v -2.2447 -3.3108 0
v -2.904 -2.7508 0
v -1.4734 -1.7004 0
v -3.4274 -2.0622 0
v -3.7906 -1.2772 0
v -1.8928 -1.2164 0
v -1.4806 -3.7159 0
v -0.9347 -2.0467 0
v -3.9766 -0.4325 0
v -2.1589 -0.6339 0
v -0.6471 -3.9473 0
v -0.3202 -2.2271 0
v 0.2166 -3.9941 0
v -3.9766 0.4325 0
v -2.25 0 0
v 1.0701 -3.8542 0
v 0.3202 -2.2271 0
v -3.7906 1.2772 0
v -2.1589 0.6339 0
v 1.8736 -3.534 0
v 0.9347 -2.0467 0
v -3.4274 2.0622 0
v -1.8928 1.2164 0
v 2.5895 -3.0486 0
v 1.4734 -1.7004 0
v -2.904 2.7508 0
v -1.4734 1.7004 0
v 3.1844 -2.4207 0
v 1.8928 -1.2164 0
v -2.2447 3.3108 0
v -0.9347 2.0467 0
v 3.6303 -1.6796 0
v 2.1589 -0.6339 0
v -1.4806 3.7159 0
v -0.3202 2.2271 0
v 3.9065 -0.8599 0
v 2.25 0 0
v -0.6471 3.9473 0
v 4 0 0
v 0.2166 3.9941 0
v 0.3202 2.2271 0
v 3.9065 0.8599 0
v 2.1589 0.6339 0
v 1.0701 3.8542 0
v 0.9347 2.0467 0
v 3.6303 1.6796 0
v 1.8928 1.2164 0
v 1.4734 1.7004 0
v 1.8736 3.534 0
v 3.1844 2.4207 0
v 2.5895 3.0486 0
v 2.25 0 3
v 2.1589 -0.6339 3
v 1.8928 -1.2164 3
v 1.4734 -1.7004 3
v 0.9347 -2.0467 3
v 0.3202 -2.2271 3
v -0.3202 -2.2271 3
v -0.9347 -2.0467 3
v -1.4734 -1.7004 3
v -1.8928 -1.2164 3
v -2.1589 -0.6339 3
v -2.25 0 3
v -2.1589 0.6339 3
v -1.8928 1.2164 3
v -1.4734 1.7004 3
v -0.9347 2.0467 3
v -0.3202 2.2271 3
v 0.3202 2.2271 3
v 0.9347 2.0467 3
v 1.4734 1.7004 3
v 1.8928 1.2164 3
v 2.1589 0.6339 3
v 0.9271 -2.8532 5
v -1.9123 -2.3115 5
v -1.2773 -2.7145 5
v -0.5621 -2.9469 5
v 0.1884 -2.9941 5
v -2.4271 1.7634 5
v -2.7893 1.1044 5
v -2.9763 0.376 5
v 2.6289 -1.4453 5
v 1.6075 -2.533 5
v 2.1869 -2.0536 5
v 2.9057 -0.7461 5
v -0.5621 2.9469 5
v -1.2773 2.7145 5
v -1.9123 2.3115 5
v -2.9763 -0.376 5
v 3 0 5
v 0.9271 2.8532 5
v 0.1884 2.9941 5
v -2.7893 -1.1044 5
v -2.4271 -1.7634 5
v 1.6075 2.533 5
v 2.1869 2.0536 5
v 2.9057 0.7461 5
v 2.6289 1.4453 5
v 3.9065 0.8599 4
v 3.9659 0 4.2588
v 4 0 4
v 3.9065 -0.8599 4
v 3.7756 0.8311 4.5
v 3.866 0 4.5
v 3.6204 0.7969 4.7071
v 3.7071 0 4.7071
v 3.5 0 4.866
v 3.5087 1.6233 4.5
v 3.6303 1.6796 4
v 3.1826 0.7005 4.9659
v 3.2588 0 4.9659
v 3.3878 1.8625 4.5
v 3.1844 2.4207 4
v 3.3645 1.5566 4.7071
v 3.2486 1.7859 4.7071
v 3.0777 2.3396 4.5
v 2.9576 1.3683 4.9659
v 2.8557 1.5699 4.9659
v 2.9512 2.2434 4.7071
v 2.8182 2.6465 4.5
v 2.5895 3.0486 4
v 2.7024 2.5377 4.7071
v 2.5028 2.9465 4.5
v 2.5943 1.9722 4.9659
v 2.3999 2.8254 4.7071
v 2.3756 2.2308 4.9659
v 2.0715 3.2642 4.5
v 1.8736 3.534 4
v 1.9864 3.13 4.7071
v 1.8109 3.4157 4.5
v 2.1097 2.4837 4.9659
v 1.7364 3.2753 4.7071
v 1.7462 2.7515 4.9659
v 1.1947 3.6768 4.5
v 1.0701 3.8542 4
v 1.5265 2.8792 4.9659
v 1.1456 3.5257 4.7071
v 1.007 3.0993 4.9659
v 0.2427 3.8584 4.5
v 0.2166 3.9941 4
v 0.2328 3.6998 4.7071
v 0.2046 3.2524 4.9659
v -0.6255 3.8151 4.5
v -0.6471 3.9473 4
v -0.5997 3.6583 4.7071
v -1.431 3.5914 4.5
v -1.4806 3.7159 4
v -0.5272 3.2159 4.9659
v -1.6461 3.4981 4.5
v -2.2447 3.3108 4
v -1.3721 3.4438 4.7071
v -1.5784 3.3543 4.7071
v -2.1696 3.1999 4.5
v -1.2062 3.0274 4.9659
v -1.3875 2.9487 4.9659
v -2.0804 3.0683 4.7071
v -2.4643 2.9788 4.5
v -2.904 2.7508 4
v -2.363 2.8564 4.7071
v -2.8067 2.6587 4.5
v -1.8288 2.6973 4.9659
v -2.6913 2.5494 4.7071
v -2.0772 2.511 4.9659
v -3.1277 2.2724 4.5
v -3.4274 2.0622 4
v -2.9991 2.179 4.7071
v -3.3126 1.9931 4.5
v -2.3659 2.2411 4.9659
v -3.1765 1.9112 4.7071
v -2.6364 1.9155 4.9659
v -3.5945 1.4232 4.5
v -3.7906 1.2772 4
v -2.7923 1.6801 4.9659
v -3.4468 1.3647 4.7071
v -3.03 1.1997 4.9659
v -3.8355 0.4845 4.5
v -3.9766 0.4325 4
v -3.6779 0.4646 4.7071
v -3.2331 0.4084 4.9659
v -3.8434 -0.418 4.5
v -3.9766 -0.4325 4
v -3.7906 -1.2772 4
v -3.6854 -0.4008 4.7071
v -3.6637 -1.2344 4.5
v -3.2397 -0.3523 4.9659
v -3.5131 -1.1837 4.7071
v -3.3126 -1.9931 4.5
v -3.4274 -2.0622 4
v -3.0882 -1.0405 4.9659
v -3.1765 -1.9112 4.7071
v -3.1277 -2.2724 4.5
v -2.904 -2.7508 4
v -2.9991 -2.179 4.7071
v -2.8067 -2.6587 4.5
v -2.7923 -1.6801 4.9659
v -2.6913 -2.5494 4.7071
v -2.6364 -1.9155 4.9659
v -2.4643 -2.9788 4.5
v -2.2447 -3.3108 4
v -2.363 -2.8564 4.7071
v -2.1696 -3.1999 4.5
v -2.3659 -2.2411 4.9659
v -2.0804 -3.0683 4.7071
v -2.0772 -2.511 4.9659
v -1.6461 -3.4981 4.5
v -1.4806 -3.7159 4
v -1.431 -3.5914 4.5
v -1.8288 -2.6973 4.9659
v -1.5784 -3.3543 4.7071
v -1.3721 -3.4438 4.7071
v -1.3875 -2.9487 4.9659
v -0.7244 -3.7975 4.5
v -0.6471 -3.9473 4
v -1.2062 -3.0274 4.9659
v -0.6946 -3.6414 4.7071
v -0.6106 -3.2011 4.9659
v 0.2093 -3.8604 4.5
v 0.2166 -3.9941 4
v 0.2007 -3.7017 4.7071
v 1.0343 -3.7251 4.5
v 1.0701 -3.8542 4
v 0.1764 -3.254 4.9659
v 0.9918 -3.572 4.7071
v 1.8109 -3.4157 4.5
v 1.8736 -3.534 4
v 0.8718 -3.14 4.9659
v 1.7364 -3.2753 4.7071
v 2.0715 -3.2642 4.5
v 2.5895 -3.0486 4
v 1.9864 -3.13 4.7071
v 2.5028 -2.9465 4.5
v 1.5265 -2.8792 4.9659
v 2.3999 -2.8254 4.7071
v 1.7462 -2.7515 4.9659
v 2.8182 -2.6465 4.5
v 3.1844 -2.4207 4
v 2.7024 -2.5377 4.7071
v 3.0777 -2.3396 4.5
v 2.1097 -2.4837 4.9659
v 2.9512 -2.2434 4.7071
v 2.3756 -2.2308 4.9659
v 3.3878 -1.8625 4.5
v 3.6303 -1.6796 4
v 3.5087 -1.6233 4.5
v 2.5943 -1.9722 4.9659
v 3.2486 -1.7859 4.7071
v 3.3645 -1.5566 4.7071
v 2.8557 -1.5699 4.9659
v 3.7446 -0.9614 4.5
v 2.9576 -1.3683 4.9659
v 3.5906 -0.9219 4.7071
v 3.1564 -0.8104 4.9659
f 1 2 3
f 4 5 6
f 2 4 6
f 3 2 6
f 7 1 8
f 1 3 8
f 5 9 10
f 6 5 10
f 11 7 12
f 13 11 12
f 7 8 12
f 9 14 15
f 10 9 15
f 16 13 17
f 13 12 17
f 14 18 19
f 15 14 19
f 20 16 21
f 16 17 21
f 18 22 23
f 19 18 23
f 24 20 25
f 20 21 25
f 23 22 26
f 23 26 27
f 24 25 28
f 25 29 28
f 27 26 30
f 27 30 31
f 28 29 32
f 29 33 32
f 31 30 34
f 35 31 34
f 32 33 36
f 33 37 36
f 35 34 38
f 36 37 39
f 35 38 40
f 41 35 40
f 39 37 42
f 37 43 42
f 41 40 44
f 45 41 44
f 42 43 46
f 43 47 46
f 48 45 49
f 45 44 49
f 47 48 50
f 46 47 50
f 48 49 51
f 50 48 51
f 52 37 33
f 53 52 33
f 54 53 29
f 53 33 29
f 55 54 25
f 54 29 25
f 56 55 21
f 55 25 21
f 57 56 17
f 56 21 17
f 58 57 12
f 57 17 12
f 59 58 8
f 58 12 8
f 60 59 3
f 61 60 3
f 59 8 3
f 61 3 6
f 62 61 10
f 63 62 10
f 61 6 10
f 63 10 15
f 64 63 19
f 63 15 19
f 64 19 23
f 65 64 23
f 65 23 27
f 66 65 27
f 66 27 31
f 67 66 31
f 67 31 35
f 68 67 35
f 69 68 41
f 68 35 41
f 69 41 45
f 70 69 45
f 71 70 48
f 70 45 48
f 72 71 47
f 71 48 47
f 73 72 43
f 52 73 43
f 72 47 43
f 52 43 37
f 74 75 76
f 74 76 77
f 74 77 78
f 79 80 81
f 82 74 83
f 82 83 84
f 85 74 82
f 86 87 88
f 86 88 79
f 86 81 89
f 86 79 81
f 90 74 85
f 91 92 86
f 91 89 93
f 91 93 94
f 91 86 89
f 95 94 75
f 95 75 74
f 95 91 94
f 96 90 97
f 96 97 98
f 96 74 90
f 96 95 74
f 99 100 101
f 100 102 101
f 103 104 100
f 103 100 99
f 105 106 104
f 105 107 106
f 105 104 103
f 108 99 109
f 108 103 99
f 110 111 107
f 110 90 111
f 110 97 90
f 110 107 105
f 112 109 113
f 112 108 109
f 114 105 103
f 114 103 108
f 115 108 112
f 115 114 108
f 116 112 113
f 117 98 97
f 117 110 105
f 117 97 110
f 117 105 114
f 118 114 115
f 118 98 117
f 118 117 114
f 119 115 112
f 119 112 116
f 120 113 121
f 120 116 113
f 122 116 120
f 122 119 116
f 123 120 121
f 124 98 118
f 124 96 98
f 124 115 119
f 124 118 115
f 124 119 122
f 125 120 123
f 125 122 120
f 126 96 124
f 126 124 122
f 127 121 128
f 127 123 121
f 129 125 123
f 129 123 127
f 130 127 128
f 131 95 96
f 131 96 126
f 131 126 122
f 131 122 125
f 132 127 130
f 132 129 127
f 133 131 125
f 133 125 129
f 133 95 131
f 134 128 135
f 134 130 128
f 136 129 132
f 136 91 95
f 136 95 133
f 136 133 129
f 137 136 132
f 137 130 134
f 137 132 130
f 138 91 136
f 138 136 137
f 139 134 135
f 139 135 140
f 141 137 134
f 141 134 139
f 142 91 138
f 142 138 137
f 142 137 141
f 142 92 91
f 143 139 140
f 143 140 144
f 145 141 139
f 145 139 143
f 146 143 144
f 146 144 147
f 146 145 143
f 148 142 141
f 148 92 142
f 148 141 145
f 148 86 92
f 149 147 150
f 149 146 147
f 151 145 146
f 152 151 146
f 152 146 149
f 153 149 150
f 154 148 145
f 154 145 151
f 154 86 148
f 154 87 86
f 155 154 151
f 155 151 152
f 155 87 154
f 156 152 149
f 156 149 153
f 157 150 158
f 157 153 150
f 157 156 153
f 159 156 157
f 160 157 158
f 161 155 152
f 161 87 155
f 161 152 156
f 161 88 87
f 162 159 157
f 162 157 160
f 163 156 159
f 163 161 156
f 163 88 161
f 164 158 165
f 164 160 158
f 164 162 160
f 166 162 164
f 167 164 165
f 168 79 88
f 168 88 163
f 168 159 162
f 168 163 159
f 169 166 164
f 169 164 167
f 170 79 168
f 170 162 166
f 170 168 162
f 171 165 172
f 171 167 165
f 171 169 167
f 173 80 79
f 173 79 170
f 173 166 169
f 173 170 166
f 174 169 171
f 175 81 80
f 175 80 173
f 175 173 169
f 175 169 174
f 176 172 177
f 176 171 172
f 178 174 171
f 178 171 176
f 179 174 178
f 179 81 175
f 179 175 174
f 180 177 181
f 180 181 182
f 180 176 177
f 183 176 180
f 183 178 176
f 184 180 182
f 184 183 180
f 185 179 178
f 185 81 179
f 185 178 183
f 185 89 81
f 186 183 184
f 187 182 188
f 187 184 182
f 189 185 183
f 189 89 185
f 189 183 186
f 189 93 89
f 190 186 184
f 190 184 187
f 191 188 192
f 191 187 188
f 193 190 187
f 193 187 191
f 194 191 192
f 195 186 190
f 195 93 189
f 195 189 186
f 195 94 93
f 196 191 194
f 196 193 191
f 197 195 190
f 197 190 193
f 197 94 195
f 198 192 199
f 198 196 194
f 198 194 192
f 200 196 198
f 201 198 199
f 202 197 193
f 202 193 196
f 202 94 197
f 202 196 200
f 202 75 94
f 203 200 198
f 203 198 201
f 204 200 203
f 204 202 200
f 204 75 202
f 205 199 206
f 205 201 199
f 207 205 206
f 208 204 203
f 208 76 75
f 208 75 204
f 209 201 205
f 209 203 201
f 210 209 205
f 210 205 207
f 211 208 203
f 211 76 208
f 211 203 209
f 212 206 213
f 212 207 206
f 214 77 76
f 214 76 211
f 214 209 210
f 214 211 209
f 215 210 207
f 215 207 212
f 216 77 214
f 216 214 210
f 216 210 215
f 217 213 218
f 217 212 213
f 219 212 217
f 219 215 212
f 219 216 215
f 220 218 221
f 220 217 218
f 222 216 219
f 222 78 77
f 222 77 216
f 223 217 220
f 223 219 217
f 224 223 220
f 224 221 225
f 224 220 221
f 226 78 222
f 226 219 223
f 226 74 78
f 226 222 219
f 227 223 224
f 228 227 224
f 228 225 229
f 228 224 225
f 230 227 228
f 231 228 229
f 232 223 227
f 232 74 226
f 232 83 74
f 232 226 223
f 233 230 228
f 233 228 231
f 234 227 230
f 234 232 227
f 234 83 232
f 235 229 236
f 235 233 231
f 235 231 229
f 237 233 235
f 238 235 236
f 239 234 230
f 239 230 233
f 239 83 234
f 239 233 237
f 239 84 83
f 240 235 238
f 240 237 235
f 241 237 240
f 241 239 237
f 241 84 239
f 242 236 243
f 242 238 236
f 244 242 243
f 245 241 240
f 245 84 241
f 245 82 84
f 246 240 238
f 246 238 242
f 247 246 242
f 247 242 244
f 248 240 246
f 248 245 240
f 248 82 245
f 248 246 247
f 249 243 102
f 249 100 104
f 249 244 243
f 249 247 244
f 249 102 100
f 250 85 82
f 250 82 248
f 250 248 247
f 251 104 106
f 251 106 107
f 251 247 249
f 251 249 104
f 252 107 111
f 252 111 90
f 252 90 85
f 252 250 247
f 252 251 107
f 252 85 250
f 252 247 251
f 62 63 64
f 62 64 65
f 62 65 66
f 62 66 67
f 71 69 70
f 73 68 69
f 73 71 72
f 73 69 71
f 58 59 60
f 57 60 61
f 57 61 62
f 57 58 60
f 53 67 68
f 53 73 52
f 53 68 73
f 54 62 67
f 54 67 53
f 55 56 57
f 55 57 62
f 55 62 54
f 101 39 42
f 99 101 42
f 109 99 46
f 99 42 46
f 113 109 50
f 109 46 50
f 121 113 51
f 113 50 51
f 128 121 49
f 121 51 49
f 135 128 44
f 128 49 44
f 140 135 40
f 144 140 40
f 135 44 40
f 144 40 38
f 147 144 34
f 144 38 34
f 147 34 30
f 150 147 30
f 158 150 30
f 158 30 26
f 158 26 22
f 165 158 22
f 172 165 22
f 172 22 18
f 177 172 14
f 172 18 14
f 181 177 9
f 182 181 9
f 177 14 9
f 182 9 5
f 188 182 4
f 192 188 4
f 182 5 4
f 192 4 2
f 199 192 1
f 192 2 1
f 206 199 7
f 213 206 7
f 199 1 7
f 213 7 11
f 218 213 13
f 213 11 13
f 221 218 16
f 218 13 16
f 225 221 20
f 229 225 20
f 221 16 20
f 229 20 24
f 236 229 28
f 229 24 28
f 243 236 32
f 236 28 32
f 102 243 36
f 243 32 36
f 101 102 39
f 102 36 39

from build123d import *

# Parameters (mm, degrees)
F0_R     = 4
F1_DEPTH = 5
F2_R     = 1
F3_R     = 2.25
F4_DEPTH = 3


with BuildPart() as f1:
    # F0 (on Top) → F1 (new body)
    with BuildSketch(Plane.XY):
        Circle(F0_R)
    extrude(amount=F1_DEPTH)

    # F2
    f2_edges = [f1.edges().sort_by_distance(p)[0] for p in [
        (-4, 0, 5),
    ]]
    fillet(f2_edges, radius=F2_R)

    # F3 (on face) → F4 (cut)
    with BuildSketch(Plane(origin=(0, 0, 0), x_dir=(1, 0, 0), z_dir=(0, 0, -1))):
        Circle(F3_R)
    extrude(amount=-F4_DEPTH, mode=Mode.SUBTRACT)


solid = f1.part
